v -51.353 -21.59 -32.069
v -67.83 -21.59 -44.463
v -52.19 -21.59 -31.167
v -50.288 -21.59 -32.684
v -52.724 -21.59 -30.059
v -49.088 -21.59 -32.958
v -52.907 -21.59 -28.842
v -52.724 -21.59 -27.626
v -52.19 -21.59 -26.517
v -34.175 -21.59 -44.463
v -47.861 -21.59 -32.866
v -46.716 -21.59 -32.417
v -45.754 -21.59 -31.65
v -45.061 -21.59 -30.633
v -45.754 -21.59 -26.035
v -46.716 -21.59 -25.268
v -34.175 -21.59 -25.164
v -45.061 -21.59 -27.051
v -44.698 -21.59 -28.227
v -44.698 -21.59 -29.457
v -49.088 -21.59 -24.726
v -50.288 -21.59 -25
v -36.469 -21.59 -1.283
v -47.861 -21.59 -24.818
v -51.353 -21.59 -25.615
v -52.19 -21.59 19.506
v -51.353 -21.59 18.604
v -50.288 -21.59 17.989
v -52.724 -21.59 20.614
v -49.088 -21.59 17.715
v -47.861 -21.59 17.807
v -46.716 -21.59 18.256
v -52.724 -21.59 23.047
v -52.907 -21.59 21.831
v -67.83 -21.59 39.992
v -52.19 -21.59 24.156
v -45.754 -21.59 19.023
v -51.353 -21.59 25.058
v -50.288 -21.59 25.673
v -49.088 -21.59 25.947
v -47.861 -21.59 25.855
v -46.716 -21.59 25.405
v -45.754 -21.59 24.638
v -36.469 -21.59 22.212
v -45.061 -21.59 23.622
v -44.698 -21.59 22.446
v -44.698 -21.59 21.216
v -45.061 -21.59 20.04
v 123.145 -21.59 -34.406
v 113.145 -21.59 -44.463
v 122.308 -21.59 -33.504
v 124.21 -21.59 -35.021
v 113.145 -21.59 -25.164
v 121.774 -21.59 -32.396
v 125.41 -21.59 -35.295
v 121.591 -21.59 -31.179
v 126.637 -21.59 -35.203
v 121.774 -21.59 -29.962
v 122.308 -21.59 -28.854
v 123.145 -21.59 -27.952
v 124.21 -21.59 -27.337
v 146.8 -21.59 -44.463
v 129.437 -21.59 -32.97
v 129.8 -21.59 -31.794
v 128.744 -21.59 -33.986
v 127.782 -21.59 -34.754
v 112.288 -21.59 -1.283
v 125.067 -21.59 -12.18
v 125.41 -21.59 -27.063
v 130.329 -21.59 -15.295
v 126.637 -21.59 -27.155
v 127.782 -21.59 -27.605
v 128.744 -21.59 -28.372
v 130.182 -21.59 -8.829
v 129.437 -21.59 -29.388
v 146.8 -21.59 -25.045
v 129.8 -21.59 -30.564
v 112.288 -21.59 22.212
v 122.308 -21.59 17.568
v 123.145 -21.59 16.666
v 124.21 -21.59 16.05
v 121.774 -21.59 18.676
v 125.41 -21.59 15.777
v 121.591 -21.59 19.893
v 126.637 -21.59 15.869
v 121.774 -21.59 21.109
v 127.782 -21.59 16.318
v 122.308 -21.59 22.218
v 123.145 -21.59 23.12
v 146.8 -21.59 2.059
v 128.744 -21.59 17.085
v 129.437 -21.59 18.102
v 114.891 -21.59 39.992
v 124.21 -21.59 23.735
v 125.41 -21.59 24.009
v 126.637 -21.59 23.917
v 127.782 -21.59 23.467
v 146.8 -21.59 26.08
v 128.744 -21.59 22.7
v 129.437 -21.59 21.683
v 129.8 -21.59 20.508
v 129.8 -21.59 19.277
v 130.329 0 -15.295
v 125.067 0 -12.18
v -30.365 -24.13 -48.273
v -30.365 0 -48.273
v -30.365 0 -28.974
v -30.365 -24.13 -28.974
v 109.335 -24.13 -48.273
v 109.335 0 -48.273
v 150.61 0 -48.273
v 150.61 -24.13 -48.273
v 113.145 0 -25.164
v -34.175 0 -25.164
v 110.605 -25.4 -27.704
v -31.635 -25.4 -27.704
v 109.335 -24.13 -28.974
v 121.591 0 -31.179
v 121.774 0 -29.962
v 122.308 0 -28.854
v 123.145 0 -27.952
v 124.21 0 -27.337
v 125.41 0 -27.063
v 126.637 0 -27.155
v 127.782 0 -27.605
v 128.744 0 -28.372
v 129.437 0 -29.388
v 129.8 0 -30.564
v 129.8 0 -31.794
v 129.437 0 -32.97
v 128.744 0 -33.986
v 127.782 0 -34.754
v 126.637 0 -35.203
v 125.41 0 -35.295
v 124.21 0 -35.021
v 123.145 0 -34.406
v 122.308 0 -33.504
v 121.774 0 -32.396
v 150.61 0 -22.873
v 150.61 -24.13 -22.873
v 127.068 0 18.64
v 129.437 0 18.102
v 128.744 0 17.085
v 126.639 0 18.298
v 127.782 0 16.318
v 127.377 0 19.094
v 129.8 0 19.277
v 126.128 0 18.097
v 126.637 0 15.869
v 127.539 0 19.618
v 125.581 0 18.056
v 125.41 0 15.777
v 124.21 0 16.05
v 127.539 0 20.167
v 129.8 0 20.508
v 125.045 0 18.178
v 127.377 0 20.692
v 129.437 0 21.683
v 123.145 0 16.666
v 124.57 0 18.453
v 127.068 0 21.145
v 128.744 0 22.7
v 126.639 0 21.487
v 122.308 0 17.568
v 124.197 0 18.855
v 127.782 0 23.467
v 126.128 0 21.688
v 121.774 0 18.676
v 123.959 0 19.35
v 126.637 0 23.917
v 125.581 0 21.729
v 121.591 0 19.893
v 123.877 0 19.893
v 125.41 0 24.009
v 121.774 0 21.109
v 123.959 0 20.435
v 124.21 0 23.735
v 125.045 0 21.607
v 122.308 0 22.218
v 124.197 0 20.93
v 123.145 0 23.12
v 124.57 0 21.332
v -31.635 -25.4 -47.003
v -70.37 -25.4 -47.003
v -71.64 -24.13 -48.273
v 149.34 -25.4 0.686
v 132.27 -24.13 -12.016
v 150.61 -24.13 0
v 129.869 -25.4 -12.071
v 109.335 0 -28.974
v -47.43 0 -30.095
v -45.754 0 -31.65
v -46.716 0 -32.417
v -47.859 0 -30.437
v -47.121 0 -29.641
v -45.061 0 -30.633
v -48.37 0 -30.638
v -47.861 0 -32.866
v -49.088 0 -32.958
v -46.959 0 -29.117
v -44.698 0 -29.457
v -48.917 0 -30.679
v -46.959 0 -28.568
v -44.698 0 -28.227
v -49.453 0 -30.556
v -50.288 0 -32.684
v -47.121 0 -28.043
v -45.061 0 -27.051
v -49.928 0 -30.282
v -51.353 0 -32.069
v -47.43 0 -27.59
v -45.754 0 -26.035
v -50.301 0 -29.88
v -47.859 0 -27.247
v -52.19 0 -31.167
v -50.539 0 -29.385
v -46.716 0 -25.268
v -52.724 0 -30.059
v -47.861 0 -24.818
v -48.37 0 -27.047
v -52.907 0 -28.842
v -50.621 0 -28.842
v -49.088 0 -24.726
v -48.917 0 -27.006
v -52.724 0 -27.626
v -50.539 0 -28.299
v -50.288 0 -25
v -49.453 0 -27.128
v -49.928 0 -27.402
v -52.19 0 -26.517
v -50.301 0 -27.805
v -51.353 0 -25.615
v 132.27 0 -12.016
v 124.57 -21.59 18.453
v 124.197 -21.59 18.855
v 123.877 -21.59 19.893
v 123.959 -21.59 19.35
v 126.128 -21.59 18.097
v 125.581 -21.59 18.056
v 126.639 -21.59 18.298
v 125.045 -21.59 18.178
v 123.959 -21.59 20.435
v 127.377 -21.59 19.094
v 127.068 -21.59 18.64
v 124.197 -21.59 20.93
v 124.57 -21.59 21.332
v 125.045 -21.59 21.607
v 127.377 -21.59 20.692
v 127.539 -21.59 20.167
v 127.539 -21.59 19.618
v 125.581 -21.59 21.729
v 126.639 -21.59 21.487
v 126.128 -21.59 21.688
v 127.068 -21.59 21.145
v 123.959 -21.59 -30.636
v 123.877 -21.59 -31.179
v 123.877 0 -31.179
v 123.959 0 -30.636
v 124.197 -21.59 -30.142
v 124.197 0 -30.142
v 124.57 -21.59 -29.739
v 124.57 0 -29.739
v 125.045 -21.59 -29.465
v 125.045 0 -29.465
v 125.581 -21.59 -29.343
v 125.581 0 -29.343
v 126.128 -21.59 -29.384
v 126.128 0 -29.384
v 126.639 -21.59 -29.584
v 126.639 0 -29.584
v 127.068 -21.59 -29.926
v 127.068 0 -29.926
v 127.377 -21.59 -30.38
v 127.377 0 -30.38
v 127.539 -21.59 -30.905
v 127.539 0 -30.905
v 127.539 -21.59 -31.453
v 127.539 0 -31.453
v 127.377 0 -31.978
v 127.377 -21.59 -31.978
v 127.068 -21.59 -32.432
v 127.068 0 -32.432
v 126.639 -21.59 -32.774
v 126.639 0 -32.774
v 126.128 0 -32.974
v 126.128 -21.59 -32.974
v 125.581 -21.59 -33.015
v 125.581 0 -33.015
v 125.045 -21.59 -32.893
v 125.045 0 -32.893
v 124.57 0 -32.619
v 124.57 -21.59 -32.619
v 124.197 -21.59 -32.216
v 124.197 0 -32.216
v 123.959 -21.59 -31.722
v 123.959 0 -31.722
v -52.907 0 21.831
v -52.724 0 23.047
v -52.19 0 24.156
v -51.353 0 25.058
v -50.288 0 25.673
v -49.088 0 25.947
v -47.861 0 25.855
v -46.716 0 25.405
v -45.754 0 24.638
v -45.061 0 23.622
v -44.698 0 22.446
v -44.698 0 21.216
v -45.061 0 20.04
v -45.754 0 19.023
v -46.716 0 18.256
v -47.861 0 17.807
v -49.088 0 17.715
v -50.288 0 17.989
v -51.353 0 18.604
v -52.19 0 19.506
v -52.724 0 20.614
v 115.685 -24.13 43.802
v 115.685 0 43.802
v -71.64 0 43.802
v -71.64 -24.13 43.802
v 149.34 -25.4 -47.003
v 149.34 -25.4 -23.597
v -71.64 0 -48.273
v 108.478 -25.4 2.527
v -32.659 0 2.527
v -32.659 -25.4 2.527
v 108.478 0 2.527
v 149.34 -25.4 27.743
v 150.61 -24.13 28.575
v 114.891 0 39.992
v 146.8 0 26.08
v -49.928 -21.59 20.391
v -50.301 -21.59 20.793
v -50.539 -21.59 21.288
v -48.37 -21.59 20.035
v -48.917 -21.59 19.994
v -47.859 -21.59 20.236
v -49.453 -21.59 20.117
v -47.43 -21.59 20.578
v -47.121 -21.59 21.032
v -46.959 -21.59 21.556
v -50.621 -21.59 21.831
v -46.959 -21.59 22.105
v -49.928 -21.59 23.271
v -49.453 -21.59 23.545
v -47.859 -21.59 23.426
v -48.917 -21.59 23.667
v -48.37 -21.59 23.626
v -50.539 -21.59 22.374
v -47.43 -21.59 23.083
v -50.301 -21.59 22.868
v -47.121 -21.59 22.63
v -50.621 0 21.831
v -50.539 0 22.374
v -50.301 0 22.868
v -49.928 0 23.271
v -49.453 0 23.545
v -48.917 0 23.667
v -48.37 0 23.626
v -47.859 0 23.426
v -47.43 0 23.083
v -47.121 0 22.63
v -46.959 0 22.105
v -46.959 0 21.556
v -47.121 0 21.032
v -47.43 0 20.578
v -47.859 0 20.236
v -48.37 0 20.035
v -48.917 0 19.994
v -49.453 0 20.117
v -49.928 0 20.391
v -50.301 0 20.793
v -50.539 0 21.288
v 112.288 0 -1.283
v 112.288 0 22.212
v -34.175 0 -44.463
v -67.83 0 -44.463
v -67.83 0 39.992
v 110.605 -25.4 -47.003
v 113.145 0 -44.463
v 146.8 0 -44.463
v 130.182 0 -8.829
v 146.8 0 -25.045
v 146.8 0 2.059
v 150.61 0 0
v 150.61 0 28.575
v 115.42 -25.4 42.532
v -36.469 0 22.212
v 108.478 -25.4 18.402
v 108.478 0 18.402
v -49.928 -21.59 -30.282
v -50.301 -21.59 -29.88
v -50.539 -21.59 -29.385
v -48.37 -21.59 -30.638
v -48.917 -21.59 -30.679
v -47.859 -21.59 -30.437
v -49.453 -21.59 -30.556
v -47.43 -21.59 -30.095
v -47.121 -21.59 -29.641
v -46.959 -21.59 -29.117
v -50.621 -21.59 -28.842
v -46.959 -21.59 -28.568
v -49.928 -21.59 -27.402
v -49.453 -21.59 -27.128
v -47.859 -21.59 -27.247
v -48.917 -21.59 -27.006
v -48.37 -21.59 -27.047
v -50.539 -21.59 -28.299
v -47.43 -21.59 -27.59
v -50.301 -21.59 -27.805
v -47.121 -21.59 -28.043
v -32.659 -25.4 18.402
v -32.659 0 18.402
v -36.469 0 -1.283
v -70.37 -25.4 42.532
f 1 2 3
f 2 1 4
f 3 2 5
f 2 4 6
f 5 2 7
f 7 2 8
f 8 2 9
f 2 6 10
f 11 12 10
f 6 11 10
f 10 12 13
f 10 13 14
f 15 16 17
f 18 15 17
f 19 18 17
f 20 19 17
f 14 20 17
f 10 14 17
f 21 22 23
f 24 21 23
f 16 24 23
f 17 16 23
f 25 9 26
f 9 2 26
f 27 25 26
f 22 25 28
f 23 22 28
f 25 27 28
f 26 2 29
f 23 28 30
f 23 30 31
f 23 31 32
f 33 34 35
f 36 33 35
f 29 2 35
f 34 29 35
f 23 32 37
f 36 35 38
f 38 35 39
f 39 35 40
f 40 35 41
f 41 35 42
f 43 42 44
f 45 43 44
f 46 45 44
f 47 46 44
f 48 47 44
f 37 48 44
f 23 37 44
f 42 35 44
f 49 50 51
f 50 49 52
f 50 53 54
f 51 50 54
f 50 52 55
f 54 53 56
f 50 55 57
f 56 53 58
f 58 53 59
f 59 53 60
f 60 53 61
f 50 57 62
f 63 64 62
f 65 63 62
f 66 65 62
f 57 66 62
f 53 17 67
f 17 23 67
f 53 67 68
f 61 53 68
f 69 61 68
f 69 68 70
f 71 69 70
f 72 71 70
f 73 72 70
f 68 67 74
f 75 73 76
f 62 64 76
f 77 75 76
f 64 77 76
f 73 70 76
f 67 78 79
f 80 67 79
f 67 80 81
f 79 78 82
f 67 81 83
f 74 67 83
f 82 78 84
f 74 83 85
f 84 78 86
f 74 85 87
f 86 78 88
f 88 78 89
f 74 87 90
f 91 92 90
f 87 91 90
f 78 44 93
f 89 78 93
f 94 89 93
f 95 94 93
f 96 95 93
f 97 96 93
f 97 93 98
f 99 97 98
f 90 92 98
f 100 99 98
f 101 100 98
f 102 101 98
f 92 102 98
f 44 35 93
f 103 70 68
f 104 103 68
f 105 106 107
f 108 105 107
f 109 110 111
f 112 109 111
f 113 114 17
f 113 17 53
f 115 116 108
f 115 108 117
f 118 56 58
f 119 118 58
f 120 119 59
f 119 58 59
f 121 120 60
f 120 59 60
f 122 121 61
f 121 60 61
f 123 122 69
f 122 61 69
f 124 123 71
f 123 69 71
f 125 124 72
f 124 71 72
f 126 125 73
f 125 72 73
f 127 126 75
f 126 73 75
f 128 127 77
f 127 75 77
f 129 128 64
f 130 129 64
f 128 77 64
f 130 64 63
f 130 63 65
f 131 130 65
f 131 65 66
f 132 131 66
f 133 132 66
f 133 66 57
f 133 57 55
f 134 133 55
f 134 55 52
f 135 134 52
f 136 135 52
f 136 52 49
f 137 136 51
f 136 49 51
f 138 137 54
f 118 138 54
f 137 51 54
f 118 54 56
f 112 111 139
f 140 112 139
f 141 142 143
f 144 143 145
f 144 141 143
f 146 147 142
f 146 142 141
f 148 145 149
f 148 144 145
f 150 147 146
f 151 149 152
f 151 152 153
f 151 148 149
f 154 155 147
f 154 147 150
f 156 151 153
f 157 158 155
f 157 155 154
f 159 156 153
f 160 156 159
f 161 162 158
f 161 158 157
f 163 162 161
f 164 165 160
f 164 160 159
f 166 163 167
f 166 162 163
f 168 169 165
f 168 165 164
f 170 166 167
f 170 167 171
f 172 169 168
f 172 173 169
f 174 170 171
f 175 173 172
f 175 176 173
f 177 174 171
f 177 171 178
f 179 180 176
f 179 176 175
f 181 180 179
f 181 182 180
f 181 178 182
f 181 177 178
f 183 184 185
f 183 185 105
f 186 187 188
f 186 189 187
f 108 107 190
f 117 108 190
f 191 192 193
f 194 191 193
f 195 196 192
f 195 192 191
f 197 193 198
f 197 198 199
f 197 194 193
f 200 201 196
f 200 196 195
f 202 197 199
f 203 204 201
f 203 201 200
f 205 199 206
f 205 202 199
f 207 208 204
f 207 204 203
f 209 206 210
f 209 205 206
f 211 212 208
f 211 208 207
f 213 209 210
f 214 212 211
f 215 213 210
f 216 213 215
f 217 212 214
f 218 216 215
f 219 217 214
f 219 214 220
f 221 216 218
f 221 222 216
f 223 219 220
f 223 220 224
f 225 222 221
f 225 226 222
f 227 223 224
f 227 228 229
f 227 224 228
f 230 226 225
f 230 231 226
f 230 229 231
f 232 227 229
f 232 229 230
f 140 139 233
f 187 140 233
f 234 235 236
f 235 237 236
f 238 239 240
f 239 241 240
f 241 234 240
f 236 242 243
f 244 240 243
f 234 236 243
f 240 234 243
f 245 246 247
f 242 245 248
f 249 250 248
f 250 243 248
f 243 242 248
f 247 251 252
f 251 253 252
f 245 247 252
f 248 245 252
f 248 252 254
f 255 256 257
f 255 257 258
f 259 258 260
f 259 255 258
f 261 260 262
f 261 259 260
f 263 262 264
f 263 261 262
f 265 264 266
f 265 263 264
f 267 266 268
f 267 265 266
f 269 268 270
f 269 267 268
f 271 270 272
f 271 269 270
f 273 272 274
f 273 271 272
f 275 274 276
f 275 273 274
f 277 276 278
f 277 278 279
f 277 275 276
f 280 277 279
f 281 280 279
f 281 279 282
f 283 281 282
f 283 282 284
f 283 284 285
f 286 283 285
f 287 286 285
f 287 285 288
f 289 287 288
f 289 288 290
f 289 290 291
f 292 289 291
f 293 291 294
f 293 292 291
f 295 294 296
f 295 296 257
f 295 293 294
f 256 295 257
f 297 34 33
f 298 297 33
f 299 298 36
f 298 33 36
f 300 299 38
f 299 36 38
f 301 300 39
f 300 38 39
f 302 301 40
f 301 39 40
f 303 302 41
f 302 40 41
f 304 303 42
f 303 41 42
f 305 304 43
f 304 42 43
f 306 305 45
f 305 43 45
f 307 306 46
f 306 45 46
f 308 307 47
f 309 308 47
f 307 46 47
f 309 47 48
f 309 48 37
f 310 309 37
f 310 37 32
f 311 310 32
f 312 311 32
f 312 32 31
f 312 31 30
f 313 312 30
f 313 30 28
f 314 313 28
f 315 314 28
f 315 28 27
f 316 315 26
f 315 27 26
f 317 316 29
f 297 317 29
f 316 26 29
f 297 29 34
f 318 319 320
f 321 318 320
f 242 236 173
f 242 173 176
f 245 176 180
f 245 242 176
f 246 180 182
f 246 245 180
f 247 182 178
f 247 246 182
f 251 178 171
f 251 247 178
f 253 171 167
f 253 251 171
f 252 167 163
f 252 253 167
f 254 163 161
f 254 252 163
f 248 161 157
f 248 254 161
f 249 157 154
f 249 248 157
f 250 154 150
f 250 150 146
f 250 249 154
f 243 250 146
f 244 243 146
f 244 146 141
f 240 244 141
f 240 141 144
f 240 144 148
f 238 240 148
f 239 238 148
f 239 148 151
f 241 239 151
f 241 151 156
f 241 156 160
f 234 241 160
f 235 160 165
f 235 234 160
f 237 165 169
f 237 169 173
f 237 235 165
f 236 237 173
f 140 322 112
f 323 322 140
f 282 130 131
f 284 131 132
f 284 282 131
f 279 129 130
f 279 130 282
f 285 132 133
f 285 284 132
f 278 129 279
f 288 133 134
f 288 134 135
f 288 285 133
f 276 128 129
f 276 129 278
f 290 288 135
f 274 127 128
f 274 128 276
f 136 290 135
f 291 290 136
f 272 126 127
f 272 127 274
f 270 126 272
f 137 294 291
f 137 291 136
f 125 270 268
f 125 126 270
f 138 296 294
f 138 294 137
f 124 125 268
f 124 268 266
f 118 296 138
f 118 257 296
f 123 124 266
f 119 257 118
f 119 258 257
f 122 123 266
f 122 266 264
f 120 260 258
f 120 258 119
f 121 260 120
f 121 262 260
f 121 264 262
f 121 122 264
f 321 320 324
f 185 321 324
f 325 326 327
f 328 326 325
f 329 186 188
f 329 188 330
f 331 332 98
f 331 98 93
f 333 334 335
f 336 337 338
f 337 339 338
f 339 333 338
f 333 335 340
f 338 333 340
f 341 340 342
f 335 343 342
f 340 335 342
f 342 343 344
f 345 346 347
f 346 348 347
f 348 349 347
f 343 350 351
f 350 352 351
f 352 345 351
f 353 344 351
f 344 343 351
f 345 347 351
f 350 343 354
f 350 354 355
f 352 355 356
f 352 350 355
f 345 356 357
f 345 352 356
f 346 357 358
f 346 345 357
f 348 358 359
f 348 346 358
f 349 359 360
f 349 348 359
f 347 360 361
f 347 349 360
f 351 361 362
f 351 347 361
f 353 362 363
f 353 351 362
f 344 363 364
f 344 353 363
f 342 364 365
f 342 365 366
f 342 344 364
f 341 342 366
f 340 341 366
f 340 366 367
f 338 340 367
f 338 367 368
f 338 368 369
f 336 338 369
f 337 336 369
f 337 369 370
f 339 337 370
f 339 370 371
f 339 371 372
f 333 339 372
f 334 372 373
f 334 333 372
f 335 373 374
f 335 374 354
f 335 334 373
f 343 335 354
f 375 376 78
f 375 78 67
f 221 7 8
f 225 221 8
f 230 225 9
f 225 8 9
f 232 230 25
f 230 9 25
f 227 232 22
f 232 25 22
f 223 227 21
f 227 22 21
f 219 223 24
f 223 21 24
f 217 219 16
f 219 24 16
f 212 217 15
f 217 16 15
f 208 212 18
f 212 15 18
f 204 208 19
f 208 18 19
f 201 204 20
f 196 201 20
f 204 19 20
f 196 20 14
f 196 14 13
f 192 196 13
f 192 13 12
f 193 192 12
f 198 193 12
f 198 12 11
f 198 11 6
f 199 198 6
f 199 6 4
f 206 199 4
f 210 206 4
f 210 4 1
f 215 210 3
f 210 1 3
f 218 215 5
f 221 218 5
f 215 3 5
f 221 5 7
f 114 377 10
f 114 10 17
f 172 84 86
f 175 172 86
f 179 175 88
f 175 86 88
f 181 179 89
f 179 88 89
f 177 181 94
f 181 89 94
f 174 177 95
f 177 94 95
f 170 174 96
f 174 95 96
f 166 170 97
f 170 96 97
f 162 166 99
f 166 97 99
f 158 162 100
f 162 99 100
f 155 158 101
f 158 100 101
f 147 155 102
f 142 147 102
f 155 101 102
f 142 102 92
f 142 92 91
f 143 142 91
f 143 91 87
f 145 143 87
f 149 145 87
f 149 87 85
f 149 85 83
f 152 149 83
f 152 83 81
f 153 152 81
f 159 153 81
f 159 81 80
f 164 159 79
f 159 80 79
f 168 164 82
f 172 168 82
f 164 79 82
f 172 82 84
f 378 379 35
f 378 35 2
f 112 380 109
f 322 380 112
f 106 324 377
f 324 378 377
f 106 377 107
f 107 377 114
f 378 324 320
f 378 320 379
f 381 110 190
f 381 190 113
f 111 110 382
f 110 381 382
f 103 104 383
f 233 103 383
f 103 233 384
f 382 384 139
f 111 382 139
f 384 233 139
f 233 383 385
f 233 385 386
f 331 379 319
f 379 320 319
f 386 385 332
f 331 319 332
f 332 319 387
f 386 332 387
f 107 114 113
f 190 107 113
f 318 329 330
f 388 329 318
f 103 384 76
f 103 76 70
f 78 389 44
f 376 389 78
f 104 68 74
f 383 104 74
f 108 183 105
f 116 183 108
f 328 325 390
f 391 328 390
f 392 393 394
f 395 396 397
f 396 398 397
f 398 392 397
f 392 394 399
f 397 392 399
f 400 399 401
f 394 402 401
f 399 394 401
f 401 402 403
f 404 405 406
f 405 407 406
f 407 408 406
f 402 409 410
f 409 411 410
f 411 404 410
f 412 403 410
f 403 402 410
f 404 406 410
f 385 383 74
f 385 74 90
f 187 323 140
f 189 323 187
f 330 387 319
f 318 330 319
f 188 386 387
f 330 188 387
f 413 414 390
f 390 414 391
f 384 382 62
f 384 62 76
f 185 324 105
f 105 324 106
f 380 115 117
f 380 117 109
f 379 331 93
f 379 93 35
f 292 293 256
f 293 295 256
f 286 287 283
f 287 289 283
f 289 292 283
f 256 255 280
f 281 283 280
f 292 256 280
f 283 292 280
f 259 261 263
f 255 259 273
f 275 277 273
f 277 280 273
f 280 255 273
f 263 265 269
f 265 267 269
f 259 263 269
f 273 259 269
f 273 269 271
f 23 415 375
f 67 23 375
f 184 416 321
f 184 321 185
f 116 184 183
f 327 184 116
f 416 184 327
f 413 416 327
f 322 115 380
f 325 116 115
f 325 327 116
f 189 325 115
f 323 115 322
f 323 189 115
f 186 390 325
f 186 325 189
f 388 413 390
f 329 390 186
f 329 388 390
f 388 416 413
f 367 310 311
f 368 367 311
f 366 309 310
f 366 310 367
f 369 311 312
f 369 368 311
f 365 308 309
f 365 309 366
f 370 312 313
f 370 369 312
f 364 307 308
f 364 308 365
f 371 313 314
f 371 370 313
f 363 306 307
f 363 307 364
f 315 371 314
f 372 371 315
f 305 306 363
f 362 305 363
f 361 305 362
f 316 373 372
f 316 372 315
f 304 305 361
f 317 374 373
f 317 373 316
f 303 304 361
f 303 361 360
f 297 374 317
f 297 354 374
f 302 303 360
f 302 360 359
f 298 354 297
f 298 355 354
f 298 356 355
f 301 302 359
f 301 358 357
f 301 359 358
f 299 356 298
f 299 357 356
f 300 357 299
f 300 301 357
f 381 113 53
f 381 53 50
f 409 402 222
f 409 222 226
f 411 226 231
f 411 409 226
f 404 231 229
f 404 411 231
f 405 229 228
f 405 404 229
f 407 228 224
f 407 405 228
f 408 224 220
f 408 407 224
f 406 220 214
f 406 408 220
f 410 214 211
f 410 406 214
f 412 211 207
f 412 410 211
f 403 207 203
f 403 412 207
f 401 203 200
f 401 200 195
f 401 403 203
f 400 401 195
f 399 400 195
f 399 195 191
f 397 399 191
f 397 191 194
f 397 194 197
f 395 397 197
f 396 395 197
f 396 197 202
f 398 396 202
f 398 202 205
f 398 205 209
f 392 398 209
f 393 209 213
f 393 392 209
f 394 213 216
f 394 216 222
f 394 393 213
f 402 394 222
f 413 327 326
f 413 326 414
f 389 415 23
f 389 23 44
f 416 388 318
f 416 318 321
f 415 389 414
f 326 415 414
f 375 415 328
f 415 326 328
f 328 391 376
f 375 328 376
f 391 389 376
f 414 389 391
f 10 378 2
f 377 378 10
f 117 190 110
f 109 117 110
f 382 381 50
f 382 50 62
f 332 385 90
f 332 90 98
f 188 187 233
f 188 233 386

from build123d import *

# Parameters (mm, degrees)
F0_W         = 141.1362439394
F0_H         = 15.875
F1_DEPTH     = 25.4
F2_SIZE      = 1.27
F3_T         = 3.81
F3_T3_DEPTH  = 31.75
F3_T5_DEPTH  = 10.3365589148
F3_T7_DEPTH  = 33.02
F3_T9_DEPTH  = 9.8197045256
F3_T11_DEPTH = 9.8197045256
F4_R         = 4.1275
F4_R_2       = 1.8415
F5_DEPTH     = 21.59


# Not quite as in the source:
# - a shell that OpenCascade refuses in one call is made with other operations: the cavity is built on its own and cut out
# - a feature names something its author has since deleted; it is built from what else it names


with BuildPart() as f1:
    # F0 (on Front) → F1 (new body)
    with BuildSketch(Plane.XZ):
        Polygon((115.6852519128, 43.8017650865), (-71.6397480872, 43.8017650865), (-71.6397480872, -48.2732349135), (-30.3647480872, -48.2732349135), (-30.3647480872, -28.973974956), (109.3352519128, -28.973974956), (109.3352519128, -48.2732349135), (150.6102519128, -48.2732349135), (150.6102519128, -22.8732349135), (132.2698407767, -12.0163811026), (150.6102519128, 0), (150.6102519128, 28.575), align=None)
        with Locations((37.9095822573, 10.4642650865)):
            Rectangle(F0_W, F0_H, mode=Mode.SUBTRACT)
    extrude(amount=F1_DEPTH)

    # F2
    f2_edges = [f1.edges().sort_by_distance(p)[0] for p in [
        (-71.639748, -25.4, -2.235735),
        (22.022752, -25.4, 43.801765),
        (133.147752, -25.4, 36.188383),
        (150.610252, -25.4, 14.2875),
        (141.440046, -25.4, -6.008191),
        (141.440046, -25.4, -17.444808),
        (150.610252, -25.4, -35.573235),
        (129.972752, -25.4, -48.273235),
        (109.335252, -25.4, -38.623605),
        (39.485252, -25.4, -28.973975),
        (-30.364748, -25.4, -38.623605),
        (-51.002248, -25.4, -48.273235),
    ]]
    chamfer(f2_edges, length=F2_SIZE)

    # F3: shell of thickness 3.81, made by hand


with BuildPart() as f3_core1:
    # F3_t2: copy of F1
    add(f1.part)

    # the walls: a layer under each face that stays
    f3_faces = [f3_core1.faces().sort_by_distance(p)[0] for p in [
        (141.4400463447, -12.065, -17.4448080081),
        (150.6102519128, -12.065, -35.5732349135),
        (140.2396500387, -24.765, -17.4721355193),
        (141.4400463447, -12.065, -6.0081905513),
        (129.9727519128, -12.065, -48.2732349135),
        (149.9752519128, -24.765, -35.5732349135),
        (39.4852519128, -25.4, -2.2357349135),
        (140.2396500387, -24.765, -6.0355180626),
        (150.6102519128, -12.065, 14.2875),
        (133.1477519128, -12.065, 36.1883825433),
        (22.0227519128, -12.065, 43.8017650865),
        (-71.6397480872, -12.065, -2.2357349135),
        (-51.0022480872, -12.065, -48.2732349135),
        (-30.3647480872, -12.065, -38.6236049347),
        (39.4852519128, -12.065, -28.973974956),
        (109.3352519128, -12.065, -38.6236049347),
        (-32.6585397124, -12.7, 10.4642650865),
        (37.9095822573, -12.7, 18.4017650865),
        (108.477704227, -12.7, 10.4642650865),
        (37.9095822573, -12.7, 2.5267650865),
        (129.9727519128, -24.765, -47.6382349135),
        (-71.0047480872, -24.765, -2.2357349135),
        (22.0227519128, -24.765, 43.1667650865),
        (-51.0022480872, -24.765, -47.6382349135),
        (132.8939724947, -24.765, 35.6062992099),
        (-30.9997480872, -24.765, -37.9886049347),
        (149.9752519128, -24.765, 14.2875),
        (39.4852519128, -24.765, -28.338974956),
        (109.9702519128, -24.765, -37.9886049347),
    ]]
    thicken(f3_faces, amount=-F3_T, mode=Mode.SUBTRACT)

    # F3_s4 → F3_t3 (cut)
    with BuildSketch(Plane.XZ.offset(-3.81)):
        Polygon((132.3101290844, -12.0154639229), (130.3290203992, -15.2949960941), (125.0674629404, -12.1803461703), (130.1818303825, -8.8294840861), align=None)
        Polygon((-30.3266480872, -29.012074956), (-34.1747480872, -28.973974956), (-34.1747480872, -25.163974956), (-30.3647480872, -25.163974956), align=None)
        Polygon((109.2971519128, -29.012074956), (109.3352519128, -25.163974956), (113.1452519128, -25.163974956), (113.1452519128, -28.973974956), align=None)
    extrude(amount=F3_T3_DEPTH, mode=Mode.SUBTRACT)

    # F3_s6 → F3_t5 (cut)
    with BuildSketch(Plane(origin=(96.491386595, 51.0431681427, 2.1966657526), x_dir=(0.4675978526, -0.8839413149, 0), z_dir=(-0.8837623948, -0.4675032053, -0.0201192112))):
        Polygon((83.2395465479, -14.1386059374), (80.1554756401, -16.4580548587), (78.415785798, -14.1899447458), (80.1068084957, -11.8853218988), align=None)
    extrude(amount=F3_T5_DEPTH, mode=Mode.SUBTRACT)

    # F3_s8 → F3_t7 (cut)
    with BuildSketch(Plane.XZ.offset(-3.81)):
        Polygon((-32.6204397124, 2.5648650865), (-36.4685397124, 2.5267650865), (-36.4685397124, -1.2832349135), (-32.6585397124, -1.2832349135), align=None)
        Polygon((-32.6204397124, 18.3636650865), (-36.4685397124, 18.4017650865), (-36.4685397124, 22.2117650865), (-32.6585397124, 22.2117650865), align=None)
        Polygon((108.439604227, 18.3636650865), (108.477704227, 22.2117650865), (112.287704227, 22.2117650865), (112.287704227, 18.4017650865), align=None)
        Polygon((108.439604227, 2.5648650865), (112.287704227, 2.5267650865), (112.287704227, -1.2832349135), (108.477704227, -1.2832349135), align=None)
    extrude(amount=F3_T7_DEPTH, mode=Mode.SUBTRACT)

    # F3_s10 → F3_t9 (cut)
    with BuildSketch(Plane(origin=(-6.3072198515, -6.3072198515, 6.3072198515), x_dir=(0.7071067812, -0.7071067812, 0), z_dir=(-0.5773502692, -0.5773502692, 0.5773502692))):
        Polygon((-4.3514826515, -45.9375348012), (-8.2186326515, -45.9045392333), (-8.2186326515, -43.7048347077), (-6.3136326515, -42.6049824449), align=None)
    extrude(amount=F3_T9_DEPTH, mode=Mode.SUBTRACT)

    # F3_s12 → F3_t11 (cut)
    with BuildSketch(Plane(origin=(32.6307211267, -32.6307211267, 32.6307211267), x_dir=(0.7071067812, 0.7071067812, 0), z_dir=(0.5773502692, -0.5773502692, 0.5773502692))):
        Polygon((60.1920614202, -78.177107985), (62.1542114202, -74.8445556287), (64.0592114202, -75.9444078915), (64.0592114202, -78.1441124172), align=None)
    extrude(amount=F3_T11_DEPTH, mode=Mode.SUBTRACT)


with BuildPart() as f1_1:
    add(f1.part)

    # what is left inside the walls is the cavity
    f3_cavity = [f3_core1.part.solids().sort_by_distance(p)[0] for p in [
        (39.485252, -21.5519, -16.311568),
    ]]
    add(f3_cavity, mode=Mode.SUBTRACT)

    # F4 (on face) → F5 (join, through all)
    with BuildSketch(Plane(origin=(0, -21.59, 0), x_dir=(-1, 0, 0), z_dir=(0, 1, 0))):
        with Locations((48.7797480872, 21.8307650865)):
            Circle(F4_R)
        with Locations((48.7797480872, 21.8307650865)):
            Circle(F4_R_2, mode=Mode.SUBTRACT)
        with Locations((48.7797480872, -28.8422349135)):
            Circle(F4_R)
        with Locations((48.7797480872, -28.8422349135)):
            Circle(F4_R_2, mode=Mode.SUBTRACT)
        with Locations((-125.7182519128, 19.8926216617)):
            Circle(F4_R)
        with Locations((-125.7182519128, 19.8926216617)):
            Circle(F4_R_2, mode=Mode.SUBTRACT)
        with Locations((-125.7182519128, -31.1790349135)):
            Circle(F4_R)
        with Locations((-125.7182519128, -31.1790349135)):
            Circle(F4_R_2, mode=Mode.SUBTRACT)
    extrude(amount=F5_DEPTH)


solid = f1_1.part
